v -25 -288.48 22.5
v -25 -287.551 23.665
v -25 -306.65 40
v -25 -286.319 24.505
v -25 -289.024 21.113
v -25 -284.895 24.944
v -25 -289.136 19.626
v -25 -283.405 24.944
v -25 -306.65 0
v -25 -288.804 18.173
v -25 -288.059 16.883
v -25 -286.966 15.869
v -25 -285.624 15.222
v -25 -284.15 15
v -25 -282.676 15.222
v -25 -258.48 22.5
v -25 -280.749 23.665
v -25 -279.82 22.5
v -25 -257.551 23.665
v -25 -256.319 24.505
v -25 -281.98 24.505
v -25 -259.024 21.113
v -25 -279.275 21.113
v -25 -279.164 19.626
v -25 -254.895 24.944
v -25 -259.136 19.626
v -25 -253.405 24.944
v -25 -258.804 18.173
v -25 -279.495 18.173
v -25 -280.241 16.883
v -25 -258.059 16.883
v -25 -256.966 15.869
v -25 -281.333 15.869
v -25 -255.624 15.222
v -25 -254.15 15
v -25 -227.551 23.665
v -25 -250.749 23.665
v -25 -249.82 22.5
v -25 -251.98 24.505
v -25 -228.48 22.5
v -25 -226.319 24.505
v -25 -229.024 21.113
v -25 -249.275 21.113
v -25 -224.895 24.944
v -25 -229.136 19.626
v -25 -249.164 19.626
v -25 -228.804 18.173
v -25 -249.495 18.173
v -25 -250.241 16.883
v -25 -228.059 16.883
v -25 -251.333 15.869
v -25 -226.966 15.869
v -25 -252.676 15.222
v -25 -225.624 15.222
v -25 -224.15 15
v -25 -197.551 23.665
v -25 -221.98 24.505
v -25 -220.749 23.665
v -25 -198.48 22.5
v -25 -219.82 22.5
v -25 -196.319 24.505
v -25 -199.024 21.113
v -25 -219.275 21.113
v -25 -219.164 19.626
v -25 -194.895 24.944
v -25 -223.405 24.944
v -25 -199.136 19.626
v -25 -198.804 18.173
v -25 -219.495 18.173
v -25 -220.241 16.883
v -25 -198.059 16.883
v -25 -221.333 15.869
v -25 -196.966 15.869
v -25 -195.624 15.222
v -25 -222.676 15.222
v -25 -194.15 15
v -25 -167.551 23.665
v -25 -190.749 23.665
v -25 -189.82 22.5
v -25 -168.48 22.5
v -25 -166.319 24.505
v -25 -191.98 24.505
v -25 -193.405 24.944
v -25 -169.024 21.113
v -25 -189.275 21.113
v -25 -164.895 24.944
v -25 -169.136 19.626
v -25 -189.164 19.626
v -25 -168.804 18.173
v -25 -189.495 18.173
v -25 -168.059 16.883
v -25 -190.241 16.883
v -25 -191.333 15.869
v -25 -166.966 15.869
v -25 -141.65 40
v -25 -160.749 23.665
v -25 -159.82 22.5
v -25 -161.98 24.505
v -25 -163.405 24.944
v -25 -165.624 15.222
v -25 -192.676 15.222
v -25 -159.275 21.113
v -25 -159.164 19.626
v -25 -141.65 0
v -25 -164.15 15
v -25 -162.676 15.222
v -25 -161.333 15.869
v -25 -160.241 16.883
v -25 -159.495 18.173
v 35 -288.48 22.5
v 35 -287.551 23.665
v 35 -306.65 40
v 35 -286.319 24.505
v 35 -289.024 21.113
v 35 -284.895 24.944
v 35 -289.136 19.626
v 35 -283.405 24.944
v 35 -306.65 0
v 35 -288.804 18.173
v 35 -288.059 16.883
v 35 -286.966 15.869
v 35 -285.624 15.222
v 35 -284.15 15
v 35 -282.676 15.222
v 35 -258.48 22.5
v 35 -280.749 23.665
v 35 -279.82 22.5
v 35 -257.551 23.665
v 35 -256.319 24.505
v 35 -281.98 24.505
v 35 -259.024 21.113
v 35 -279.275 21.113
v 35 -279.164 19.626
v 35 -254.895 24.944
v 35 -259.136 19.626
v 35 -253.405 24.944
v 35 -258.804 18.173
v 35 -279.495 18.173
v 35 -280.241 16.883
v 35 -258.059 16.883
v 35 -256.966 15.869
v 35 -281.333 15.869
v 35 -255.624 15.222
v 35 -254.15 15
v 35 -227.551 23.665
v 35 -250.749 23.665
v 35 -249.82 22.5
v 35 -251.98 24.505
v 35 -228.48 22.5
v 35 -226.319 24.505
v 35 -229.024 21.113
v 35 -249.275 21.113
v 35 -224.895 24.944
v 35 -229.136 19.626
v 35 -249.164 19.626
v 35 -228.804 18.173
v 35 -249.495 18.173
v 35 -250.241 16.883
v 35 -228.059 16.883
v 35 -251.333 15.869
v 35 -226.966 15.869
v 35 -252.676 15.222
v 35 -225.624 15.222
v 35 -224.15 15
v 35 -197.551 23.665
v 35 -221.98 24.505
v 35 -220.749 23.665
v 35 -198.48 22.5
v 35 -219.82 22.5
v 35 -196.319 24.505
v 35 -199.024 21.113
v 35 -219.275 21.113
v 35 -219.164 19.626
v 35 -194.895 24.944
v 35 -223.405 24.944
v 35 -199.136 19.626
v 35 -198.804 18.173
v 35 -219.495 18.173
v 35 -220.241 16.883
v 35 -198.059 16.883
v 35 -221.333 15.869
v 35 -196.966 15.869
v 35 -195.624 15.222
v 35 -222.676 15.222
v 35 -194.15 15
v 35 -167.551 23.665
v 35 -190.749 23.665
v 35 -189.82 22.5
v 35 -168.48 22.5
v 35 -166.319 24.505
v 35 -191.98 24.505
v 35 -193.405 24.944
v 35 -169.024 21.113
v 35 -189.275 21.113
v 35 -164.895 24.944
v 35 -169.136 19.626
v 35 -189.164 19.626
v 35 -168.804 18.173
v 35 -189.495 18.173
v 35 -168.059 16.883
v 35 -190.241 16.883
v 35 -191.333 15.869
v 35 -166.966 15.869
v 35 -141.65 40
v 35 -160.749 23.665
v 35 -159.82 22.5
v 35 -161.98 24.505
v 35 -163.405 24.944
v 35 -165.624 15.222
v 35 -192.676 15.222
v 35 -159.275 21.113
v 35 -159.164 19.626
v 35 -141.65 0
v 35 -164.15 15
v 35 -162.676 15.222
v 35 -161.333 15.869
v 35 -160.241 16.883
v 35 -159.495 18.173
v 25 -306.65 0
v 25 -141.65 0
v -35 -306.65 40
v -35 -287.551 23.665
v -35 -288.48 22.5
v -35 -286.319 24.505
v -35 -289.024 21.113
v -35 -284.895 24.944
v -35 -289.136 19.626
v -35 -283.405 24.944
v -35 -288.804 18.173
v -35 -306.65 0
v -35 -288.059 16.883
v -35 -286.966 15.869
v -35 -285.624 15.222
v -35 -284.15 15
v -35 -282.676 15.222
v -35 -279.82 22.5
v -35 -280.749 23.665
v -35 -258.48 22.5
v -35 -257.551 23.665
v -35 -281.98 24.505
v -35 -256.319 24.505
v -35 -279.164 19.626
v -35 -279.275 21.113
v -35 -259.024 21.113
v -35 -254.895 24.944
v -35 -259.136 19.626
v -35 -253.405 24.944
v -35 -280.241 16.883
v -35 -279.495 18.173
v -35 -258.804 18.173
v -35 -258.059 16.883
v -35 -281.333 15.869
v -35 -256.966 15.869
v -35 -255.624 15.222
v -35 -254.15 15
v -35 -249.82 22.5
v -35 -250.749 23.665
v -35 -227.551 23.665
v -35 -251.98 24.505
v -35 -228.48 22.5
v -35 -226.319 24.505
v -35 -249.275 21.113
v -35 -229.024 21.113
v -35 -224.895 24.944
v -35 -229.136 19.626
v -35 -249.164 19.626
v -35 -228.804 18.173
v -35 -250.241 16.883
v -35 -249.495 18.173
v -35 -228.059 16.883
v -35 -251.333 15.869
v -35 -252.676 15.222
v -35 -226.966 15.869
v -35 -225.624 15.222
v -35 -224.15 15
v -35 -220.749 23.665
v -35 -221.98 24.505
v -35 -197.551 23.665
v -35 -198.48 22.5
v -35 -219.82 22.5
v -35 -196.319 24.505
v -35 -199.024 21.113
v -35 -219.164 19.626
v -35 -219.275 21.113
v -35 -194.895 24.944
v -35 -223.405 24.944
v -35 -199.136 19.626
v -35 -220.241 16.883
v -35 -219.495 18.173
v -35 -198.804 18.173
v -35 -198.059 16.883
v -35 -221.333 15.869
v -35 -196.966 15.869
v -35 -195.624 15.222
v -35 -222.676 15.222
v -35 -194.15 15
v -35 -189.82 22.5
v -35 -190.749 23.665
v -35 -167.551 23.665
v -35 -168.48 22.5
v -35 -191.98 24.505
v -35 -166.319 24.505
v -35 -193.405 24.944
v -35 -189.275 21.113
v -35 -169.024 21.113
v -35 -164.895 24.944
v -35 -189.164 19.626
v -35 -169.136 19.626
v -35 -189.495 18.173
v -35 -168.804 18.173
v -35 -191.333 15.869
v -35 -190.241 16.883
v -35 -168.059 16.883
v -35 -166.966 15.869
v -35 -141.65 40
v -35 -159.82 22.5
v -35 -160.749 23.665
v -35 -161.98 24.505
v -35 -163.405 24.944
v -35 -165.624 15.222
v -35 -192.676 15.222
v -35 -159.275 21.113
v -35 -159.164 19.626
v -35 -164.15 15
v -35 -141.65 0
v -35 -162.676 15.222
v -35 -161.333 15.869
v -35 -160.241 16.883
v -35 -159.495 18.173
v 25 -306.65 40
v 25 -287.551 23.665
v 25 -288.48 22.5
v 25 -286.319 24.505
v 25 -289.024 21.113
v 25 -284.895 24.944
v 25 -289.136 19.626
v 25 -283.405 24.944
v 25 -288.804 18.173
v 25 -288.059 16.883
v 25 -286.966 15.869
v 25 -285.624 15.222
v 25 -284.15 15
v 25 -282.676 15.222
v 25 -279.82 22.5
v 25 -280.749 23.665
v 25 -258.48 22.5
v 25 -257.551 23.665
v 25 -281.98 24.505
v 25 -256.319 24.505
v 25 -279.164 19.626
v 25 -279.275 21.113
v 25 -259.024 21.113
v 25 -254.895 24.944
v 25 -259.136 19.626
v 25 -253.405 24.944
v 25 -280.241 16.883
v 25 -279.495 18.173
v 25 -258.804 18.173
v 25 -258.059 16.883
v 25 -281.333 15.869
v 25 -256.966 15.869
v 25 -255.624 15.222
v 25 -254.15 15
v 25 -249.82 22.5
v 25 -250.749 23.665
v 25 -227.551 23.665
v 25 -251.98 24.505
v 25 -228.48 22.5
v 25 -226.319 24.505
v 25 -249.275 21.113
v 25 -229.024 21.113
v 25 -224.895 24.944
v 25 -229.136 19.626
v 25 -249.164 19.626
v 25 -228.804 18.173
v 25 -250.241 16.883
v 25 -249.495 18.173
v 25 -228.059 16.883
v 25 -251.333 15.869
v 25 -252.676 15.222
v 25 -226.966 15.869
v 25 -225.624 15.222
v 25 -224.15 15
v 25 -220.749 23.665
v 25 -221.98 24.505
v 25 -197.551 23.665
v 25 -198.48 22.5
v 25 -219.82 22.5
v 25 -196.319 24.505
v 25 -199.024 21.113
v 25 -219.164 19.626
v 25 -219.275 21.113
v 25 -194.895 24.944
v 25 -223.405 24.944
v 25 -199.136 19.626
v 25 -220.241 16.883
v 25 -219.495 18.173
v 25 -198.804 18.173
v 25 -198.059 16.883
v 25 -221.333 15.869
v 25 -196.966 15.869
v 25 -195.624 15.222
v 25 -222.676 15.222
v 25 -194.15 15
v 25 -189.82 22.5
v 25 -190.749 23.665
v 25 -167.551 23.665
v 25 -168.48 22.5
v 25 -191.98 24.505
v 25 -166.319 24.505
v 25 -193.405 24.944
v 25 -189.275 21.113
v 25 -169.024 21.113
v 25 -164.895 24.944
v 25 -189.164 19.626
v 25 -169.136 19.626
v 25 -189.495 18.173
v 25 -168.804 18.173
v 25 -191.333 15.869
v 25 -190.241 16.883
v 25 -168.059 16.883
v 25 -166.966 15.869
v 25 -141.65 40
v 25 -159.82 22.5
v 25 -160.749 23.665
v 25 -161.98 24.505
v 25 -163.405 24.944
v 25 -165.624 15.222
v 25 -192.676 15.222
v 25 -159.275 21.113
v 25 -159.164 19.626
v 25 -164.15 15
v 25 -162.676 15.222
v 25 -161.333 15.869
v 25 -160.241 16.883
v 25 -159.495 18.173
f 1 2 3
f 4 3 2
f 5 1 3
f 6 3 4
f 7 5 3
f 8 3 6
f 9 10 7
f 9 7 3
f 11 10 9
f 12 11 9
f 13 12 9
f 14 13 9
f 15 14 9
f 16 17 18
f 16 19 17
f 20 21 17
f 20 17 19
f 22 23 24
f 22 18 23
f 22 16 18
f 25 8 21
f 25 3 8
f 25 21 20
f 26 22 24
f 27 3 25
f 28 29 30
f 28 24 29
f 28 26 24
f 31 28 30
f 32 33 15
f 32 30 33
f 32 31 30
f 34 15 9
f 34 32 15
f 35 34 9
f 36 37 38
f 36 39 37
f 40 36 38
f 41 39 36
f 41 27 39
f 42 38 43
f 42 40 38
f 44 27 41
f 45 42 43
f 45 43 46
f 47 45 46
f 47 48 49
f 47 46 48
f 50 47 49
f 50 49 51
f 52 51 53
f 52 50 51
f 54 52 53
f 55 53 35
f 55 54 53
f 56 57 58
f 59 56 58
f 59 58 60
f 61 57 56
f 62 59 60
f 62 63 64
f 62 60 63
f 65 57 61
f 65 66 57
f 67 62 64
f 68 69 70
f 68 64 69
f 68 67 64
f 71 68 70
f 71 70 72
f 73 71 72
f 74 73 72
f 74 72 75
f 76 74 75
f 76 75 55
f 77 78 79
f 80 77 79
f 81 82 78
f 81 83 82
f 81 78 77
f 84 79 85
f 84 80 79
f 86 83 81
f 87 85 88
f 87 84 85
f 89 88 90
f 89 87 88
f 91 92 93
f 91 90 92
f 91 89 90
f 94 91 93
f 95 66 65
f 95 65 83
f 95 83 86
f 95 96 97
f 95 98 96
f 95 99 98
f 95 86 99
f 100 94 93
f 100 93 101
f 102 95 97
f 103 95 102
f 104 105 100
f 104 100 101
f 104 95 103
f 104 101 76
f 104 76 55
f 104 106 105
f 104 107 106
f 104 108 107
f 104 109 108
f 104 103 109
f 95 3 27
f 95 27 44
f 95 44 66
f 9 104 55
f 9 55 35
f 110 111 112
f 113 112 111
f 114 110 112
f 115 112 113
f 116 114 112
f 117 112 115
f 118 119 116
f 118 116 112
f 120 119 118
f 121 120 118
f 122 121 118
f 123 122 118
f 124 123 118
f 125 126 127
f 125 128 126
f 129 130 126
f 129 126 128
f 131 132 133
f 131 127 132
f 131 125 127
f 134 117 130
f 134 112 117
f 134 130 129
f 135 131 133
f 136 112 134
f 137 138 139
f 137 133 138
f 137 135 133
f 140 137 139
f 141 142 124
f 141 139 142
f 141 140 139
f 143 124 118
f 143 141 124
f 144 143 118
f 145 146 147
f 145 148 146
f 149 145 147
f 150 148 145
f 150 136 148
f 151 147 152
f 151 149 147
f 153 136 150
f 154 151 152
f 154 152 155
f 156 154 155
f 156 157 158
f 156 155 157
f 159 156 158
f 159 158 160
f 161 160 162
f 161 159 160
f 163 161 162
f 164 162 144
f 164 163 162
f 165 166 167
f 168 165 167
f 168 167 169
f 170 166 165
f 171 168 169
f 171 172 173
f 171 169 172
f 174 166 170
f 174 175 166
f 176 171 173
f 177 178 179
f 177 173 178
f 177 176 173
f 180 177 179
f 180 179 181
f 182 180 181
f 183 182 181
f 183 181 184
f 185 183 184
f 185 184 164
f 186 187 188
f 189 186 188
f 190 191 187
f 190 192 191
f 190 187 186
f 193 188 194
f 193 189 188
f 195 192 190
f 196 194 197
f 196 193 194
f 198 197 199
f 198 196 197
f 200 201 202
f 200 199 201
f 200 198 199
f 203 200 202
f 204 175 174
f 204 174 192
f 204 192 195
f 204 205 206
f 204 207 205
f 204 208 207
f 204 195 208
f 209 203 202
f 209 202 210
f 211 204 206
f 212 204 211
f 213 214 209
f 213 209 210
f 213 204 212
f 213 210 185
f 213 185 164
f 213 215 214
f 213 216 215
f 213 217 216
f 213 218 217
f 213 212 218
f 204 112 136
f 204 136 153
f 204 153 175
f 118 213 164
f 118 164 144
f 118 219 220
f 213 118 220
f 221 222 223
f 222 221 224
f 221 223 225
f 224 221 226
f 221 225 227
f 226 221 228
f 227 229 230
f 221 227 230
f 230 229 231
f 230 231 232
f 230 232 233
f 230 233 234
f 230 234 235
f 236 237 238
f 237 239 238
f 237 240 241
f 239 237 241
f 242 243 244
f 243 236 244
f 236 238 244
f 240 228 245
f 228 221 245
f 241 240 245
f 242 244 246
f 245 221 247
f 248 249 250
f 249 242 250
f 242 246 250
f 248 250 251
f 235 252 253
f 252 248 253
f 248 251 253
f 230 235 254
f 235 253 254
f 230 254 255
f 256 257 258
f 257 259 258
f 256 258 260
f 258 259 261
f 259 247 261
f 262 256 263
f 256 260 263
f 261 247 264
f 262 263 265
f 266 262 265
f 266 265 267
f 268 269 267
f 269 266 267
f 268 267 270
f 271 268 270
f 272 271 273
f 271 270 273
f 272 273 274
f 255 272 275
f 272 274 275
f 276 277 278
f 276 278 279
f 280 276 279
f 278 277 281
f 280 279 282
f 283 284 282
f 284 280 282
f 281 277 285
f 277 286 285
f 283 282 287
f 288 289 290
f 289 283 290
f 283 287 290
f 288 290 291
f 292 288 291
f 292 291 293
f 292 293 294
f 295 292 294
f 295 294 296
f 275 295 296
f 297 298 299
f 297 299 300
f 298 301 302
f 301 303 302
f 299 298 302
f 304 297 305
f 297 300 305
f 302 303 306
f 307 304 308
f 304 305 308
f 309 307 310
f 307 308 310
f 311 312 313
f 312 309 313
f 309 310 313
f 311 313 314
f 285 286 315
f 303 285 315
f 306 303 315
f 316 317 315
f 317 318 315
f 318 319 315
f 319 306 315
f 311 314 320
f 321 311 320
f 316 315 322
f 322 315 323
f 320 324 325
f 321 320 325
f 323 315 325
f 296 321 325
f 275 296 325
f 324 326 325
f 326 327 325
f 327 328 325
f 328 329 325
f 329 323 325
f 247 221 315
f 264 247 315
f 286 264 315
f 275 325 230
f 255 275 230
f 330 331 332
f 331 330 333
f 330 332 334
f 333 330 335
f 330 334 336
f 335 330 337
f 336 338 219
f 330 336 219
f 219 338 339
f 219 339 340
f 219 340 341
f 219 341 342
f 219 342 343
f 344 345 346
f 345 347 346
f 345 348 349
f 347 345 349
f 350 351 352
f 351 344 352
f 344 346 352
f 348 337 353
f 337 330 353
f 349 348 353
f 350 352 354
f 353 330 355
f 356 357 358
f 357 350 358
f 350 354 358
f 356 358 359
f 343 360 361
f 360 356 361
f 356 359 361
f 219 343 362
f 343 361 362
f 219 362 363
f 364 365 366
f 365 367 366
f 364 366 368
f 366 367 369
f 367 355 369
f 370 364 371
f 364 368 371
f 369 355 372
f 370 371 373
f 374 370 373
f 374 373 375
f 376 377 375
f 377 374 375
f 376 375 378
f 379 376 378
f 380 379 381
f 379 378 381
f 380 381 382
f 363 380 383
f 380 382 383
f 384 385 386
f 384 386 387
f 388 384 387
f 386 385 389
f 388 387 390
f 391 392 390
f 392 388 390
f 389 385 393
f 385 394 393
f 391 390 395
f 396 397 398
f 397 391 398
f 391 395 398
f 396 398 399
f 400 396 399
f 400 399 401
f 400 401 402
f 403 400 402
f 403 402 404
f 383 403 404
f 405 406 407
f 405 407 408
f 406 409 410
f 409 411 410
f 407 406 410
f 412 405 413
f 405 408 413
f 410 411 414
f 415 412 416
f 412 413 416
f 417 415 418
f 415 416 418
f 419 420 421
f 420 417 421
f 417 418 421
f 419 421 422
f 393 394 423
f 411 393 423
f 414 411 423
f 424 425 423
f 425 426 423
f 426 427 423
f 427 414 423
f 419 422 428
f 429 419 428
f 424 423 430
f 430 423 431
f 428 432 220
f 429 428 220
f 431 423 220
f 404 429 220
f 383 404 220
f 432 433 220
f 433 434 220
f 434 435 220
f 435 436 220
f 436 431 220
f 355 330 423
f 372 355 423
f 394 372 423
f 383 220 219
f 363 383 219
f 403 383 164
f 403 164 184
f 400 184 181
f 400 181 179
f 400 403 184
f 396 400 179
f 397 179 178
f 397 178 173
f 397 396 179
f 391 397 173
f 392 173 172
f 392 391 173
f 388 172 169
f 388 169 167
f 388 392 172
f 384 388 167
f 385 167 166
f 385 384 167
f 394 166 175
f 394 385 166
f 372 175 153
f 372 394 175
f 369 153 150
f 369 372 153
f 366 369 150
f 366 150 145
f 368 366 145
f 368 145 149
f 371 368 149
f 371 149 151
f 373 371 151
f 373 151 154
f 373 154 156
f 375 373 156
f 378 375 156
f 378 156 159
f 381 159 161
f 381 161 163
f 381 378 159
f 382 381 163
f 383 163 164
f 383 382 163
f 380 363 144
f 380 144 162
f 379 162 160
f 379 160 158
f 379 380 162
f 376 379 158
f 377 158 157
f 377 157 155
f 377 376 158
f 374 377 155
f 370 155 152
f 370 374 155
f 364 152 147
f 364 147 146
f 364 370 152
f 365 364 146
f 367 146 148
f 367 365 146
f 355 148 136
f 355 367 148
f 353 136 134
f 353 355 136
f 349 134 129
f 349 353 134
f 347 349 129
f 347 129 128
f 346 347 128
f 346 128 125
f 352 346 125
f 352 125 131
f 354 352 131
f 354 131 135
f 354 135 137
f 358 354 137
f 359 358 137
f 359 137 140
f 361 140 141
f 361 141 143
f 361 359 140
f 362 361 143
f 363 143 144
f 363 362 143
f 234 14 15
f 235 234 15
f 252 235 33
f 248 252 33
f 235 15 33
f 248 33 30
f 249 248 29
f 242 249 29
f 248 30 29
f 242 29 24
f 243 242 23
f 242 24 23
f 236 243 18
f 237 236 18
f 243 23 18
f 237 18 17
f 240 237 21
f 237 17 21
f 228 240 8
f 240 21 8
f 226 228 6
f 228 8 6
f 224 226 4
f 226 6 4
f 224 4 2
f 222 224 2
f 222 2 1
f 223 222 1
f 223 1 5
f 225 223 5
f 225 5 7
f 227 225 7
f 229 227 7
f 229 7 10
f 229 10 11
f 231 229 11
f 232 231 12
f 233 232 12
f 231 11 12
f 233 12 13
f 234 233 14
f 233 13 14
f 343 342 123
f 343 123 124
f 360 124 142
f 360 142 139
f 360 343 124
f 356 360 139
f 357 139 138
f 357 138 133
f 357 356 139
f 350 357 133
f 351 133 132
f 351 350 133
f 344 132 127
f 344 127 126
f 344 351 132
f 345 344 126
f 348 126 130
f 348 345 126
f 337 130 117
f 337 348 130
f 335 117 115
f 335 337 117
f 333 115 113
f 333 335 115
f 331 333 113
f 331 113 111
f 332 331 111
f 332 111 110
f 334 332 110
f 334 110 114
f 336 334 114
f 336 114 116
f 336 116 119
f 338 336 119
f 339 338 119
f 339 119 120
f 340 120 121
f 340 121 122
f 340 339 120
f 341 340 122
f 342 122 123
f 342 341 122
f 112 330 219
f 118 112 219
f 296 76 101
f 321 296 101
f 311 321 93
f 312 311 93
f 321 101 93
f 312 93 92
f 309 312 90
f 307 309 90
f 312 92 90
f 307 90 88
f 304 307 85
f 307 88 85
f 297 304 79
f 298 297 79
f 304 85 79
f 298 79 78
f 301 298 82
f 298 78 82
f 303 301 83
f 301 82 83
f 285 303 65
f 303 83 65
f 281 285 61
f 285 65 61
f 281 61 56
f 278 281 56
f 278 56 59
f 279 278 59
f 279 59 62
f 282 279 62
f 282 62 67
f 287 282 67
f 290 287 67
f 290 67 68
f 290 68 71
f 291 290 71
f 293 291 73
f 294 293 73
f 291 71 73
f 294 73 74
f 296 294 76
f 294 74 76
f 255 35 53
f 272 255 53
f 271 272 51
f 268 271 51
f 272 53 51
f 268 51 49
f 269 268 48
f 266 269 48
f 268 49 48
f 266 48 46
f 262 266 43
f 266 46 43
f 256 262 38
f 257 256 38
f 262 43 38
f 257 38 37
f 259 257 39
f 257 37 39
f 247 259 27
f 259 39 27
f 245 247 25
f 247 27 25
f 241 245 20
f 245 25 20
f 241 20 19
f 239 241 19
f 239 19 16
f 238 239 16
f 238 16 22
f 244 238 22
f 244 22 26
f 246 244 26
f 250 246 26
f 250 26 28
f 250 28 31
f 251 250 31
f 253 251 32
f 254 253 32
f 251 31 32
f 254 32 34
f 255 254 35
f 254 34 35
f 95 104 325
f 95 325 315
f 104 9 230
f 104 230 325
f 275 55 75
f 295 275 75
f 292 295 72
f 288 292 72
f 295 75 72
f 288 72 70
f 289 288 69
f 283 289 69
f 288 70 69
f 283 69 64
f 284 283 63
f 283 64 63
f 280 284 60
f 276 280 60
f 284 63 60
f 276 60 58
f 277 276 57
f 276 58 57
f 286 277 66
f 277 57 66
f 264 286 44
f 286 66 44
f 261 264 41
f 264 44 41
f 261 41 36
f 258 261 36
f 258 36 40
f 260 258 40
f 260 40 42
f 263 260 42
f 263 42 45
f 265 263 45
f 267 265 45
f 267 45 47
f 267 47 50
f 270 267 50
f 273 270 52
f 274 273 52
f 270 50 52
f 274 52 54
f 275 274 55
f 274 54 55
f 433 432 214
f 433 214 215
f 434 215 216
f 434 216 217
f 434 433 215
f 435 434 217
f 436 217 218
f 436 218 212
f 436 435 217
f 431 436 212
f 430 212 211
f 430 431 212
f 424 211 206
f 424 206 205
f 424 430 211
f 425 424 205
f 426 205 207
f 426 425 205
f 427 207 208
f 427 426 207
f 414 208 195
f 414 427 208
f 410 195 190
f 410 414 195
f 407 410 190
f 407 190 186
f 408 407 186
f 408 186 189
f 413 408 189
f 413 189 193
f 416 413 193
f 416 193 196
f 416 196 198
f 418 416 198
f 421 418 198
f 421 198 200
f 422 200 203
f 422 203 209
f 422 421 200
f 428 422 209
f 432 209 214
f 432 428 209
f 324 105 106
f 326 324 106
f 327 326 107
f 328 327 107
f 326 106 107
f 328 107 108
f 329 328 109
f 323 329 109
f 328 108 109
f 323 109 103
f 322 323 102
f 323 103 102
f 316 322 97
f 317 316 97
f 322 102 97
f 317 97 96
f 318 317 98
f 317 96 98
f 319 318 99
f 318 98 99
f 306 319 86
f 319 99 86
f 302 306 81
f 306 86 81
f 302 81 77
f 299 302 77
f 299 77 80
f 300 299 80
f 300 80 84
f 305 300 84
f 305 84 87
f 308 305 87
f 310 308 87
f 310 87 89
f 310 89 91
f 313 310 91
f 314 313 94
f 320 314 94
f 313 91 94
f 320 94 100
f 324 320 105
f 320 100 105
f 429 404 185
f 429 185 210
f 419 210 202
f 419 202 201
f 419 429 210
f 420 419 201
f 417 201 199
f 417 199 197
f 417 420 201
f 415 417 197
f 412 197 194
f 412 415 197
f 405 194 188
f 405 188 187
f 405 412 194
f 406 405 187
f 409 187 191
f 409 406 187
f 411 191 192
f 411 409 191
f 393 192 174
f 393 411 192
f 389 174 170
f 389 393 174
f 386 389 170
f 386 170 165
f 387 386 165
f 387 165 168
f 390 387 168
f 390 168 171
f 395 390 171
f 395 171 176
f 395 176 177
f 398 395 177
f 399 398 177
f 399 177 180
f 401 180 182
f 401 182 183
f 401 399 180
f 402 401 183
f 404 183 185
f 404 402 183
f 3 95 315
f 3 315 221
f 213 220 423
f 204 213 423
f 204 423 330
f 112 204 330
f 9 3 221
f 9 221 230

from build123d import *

# Parameters (mm, degrees)
SKETCH2_R           = 5
BOSS_EXTRUDE1_DEPTH = 10


with BuildPart() as part:
    # Sketch2 → Boss-Extrude1 (new body)
    with BuildSketch(Plane(origin=(-25, 0, 0), x_dir=(0, 0, -1), z_dir=(1, 0, 0))):
        Polygon((-40, -141.649794608), (-40, -211.649794608), (-40, -236.649794608), (-40, -306.649794608), (0, -306.649794608), (0, -236.649794608), (0, -141.649794608), align=None)
        with Locations((-20, -284.149794608)):
            Circle(SKETCH2_R, mode=Mode.SUBTRACT)
        with Locations((-20, -254.149794608)):
            Circle(SKETCH2_R, mode=Mode.SUBTRACT)
        with Locations((-20, -224.149794608)):
            Circle(SKETCH2_R, mode=Mode.SUBTRACT)
        with Locations((-20, -194.149794608)):
            Circle(SKETCH2_R, mode=Mode.SUBTRACT)
        with Locations((-20, -164.149794608)):
            Circle(SKETCH2_R, mode=Mode.SUBTRACT)
    extrude(amount=-BOSS_EXTRUDE1_DEPTH)


with BuildPart() as body_2:
    # Mirror2: mirrored copy
    add(part.part.mirror(Plane(origin=(0, 0, 0), x_dir=(0, 0, 1), z_dir=(1, 0, 0))))


solid = Compound([part.part, body_2.part])
